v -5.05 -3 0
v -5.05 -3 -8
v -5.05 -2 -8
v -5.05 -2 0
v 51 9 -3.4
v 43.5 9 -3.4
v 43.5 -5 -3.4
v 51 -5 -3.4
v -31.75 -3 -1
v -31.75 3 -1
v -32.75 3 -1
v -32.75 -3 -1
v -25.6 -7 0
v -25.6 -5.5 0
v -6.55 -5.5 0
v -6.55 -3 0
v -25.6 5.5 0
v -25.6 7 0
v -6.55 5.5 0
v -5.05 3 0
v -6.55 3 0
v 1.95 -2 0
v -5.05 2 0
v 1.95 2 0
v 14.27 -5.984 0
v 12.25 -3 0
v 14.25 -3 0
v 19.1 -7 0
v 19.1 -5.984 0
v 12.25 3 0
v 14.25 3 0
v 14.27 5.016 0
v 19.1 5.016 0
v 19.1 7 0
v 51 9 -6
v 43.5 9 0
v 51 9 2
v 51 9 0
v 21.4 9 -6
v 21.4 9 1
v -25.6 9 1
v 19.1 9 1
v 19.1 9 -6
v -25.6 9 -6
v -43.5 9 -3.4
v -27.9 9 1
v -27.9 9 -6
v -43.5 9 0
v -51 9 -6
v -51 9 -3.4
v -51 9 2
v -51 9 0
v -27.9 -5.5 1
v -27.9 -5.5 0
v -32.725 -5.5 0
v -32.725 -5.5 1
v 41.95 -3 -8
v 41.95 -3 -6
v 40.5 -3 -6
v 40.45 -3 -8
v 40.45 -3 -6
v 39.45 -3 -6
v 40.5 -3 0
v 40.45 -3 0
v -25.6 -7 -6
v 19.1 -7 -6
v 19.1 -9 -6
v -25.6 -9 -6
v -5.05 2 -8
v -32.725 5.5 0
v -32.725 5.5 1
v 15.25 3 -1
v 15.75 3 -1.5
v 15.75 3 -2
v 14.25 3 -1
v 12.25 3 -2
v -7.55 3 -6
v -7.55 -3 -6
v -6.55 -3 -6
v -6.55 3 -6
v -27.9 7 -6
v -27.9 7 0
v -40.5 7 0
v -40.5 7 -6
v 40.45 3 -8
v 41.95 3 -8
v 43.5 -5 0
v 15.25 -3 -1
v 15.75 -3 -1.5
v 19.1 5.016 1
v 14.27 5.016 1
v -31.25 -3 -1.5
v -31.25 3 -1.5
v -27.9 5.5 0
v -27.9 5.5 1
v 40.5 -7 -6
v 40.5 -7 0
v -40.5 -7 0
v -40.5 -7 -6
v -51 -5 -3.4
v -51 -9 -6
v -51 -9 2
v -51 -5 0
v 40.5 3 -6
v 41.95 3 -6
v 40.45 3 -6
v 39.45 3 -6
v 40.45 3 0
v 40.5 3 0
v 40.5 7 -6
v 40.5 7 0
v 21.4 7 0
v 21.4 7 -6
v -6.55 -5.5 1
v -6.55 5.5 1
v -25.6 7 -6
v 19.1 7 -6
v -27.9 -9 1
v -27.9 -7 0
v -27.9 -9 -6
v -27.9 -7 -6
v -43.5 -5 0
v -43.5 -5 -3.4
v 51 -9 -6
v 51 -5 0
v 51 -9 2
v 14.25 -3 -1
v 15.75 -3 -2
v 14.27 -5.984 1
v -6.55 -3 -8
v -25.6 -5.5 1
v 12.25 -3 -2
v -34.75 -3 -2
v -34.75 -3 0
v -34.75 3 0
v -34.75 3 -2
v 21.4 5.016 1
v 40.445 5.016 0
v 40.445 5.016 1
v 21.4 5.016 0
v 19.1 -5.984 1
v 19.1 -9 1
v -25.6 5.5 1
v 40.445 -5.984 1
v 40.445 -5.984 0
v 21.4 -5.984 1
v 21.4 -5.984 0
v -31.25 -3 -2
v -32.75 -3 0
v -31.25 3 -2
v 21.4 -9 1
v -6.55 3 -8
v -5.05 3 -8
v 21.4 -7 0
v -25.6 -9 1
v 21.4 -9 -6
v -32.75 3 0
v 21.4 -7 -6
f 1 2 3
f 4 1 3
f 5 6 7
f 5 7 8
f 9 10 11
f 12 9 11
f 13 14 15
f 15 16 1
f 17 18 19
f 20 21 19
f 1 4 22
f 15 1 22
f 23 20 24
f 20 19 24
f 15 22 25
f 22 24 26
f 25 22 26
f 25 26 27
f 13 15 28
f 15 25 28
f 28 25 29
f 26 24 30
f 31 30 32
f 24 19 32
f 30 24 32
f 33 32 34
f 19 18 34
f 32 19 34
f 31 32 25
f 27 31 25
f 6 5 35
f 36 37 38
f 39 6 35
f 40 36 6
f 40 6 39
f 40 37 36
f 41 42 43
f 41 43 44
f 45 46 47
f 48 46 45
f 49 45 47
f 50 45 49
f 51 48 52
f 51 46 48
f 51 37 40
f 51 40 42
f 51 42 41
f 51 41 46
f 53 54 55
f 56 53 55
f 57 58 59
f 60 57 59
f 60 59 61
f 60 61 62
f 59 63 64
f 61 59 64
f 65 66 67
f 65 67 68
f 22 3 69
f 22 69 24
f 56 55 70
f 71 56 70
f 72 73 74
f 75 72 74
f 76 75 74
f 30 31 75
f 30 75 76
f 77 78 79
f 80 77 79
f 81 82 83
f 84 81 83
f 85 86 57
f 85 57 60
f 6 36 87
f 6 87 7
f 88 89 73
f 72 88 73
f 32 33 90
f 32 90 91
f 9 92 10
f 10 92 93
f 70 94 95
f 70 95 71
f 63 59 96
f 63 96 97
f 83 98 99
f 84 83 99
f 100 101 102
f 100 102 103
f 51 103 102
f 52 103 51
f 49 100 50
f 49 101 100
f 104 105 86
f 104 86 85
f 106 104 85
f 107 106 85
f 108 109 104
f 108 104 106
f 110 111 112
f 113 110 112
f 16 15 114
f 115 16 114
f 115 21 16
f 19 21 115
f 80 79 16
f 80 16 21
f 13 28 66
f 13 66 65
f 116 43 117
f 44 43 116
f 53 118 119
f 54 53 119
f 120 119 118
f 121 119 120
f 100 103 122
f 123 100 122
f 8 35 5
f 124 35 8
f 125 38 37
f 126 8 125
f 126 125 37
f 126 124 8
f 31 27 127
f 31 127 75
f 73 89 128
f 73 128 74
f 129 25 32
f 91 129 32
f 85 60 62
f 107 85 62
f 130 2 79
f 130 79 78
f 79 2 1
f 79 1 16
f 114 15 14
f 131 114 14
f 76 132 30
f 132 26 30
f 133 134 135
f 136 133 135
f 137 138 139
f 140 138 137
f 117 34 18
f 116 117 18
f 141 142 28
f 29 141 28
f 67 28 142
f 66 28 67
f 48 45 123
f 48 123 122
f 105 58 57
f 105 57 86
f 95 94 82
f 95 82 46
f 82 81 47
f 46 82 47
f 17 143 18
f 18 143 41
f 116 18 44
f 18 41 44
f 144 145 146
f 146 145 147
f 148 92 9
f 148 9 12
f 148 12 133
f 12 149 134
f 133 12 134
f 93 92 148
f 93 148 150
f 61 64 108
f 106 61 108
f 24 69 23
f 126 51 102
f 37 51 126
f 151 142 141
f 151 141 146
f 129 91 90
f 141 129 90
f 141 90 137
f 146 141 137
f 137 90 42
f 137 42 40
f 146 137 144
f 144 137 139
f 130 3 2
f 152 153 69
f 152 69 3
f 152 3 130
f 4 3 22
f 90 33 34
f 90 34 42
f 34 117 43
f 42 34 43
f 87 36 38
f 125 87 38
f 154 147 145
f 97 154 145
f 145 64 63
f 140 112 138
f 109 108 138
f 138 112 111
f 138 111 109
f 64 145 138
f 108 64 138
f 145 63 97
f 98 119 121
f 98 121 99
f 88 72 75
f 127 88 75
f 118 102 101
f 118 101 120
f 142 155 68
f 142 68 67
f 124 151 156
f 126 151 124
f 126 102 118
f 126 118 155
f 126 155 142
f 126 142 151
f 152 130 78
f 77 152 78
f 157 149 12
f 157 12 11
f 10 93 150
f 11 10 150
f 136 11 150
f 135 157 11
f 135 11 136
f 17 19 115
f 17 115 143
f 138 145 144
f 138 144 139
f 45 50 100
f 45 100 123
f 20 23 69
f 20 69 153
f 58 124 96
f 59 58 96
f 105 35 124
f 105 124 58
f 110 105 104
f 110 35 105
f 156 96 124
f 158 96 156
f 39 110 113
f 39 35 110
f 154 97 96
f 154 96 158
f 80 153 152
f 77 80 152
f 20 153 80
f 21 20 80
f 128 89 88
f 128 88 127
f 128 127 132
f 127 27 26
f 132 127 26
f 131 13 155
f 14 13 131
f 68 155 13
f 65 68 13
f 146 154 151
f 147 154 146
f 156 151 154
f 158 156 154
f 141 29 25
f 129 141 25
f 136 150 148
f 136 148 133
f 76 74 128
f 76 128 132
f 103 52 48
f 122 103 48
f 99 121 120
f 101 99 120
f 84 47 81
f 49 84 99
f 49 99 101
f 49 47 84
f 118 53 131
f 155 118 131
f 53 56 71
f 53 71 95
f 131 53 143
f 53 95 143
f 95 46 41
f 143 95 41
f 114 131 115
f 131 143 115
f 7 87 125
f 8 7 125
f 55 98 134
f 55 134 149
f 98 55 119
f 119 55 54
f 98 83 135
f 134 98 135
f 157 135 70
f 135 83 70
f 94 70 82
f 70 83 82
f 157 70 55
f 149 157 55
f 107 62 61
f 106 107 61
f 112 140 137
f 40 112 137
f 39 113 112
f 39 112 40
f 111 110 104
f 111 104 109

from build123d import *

# Parameters (mm, degrees)
SKETCH1_W            = 102
SKETCH1_H            = 18
BOSS_EXTRUDE1_DEPTH  = 2
BOSS_EXTRUDE2_DEPTH  = 18
SKETCH4_W            = 81
SKETCH4_H            = 2
BOSS_EXTRUDE3_DEPTH  = 6
SKETCH5_W            = 2.3
SKETCH5_H            = 2
CUT_EXTRUDE1_DEPTH   = 6
SKETCH8_W            = 2
SKETCH8_H            = 6
BOSS_EXTRUDE5_DEPTH  = 1
SKETCH10_W           = 3.5
SKETCH10_H           = 6
BOSS_EXTRUDE6_DEPTH  = 1
SKETCH11_W           = 1.5
SKETCH11_H           = 6
BOSS_EXTRUDE7_DEPTH  = 8
BOSS_EXTRUDE8_DEPTH  = 6
RIB1_REACH           = 54.402
SKETCH17_WALL_W      = 117.434725866
SKETCH17_WALL_H      = 4
CHAMFER1_SIZE        = 0.5
SKETCH18_W           = 7.5
SKETCH18_H           = 3.4
BOSS_EXTRUDE10_DEPTH = 4
SKETCH19_W           = 26.1754507
SKETCH19_H           = 11
CUT_EXTRUDE3_DEPTH   = 1
SKETCH20_W           = 2.3
SKETCH20_H           = 1
CUT_EXTRUDE4_DEPTH   = 18


with BuildPart() as part:
    # Sketch1 → Boss-Extrude1 (new body)
    with BuildSketch(Plane.XY):
        Rectangle(SKETCH1_W, SKETCH1_H)
    extrude(amount=BOSS_EXTRUDE1_DEPTH)

    # Sketch2 → Boss-Extrude2 (add)
    with BuildSketch(Plane(origin=(0, 9, 0), x_dir=(1, 0, 0), z_dir=(0, 1, 0))):
        Polygon((-43.5, 0), (-40.5, 0), (-40.5, 6), (-51, 6), (-51, 3.4), (-43.5, 3.4), align=None)
        Polygon((40.5, 6), (40.5, 0), (43.5, 0), (43.5, 3.4), (51, 3.4), (51, 6), align=None)
    extrude(amount=-BOSS_EXTRUDE2_DEPTH)

    # Sketch4 → Boss-Extrude3 (add)
    with BuildSketch(Plane(origin=(0, 0, 0), x_dir=(-1, 0, 0), z_dir=(0, 0, -1))):
        with Locations((0, 8)):
            Rectangle(SKETCH4_W, SKETCH4_H)
        with Locations((0, -8)):
            Rectangle(SKETCH4_W, SKETCH4_H)
    extrude(amount=BOSS_EXTRUDE3_DEPTH)

    # Sketch5 → Cut-Extrude1 (cut)
    with BuildSketch(Plane(origin=(0, 0, -6), x_dir=(-1, 0, 0), z_dir=(0, 0, -1))):
        with Locations((26.75, -8)):
            Rectangle(SKETCH5_W, SKETCH5_H)
        with Locations((26.75, 8)):
            Rectangle(SKETCH5_W, SKETCH5_H)
        with Locations((-20.25, 8)):
            Rectangle(SKETCH5_W, SKETCH5_H)
        with Locations((-20.25, -8)):
            Rectangle(SKETCH5_W, SKETCH5_H)
    extrude(amount=-CUT_EXTRUDE1_DEPTH, mode=Mode.SUBTRACT)

    # Sketch8 → Boss-Extrude5 (add)
    with BuildSketch(Plane(origin=(0, 0, 0), x_dir=(-1, 0, 0), z_dir=(0, 0, -1))):
        with Locations((33.75, 0)):
            Rectangle(SKETCH8_W, SKETCH8_H)
        with Locations((-13.25, 0)):
            Rectangle(SKETCH8_W, SKETCH8_H)
    extrude(amount=BOSS_EXTRUDE5_DEPTH)

    # Sketch10 → Boss-Extrude6 (add)
    with BuildSketch(Plane(origin=(0, 0, -1), x_dir=(-1, 0, 0), z_dir=(0, 0, -1))):
        with Locations((-14, 0)):
            Rectangle(SKETCH10_W, SKETCH10_H)
        with Locations((33, 0)):
            Rectangle(SKETCH10_W, SKETCH10_H)
    extrude(amount=BOSS_EXTRUDE6_DEPTH)

    # Sketch11 → Boss-Extrude7 (add)
    with BuildSketch(Plane(origin=(0, 0, 0), x_dir=(-1, 0, 0), z_dir=(0, 0, -1))):
        with Locations((5.8, 0)):
            Rectangle(SKETCH11_W, SKETCH11_H)
        with Locations((-41.2, 0)):
            Rectangle(SKETCH11_W, SKETCH11_H)
    extrude(amount=BOSS_EXTRUDE7_DEPTH)

    # Sketch12 → Boss-Extrude8 (add)
    with BuildSketch(Plane.XZ.offset(3)):
        Polygon((-6.55, -8), (-7.55, -6), (-6.55, -6), align=None)
        Polygon((40.45, -8), (39.45, -6), (40.45, -6), align=None)
    extrude(amount=-BOSS_EXTRUDE8_DEPTH)

    # Sketch17 wall → Rib1 (add, up to next)
    with BuildSketch(Plane(origin=(-1.55, 0, -4), x_dir=(0.658504607869, 0, 0.752576694707), z_dir=(0.752576694707, 0, -0.658504607869)), mode=Mode.PRIVATE) as rib1_sk1:
        Rectangle(SKETCH17_WALL_W, SKETCH17_WALL_H)
    rib1_tool1 = extrude(rib1_sk1.sketch, amount=-RIB1_REACH, mode=Mode.PRIVATE) - part.part
    add(rib1_tool1.solids().sort_by_distance((-1.55, 0, -4))[0])

    # Chamfer1
    chamfer1_edges = [part.edges().sort_by_distance(p)[0] for p in [
        (-31.25, 0, -1),
        (15.75, 0, -1),
    ]]
    chamfer(chamfer1_edges, length=CHAMFER1_SIZE)

    # Sketch18 → Boss-Extrude10 (add)
    with BuildSketch(Plane.XZ.offset(9)):
        with Locations((47.25, -1.7)):
            Rectangle(SKETCH18_W, SKETCH18_H)
        with Locations((-47.25, -1.7)):
            Rectangle(SKETCH18_W, SKETCH18_H)
    extrude(amount=-BOSS_EXTRUDE10_DEPTH)

    # Sketch19 → Cut-Extrude3 (cut)
    with BuildSketch(Plane(origin=(0, 0, 0), x_dir=(-1, 0, 0), z_dir=(0, 0, -1))):
        with Locations((19.63772535, 0)):
            Rectangle(SKETCH19_W, SKETCH19_H)
        with Locations((-27.35772535, -0.484068742)):
            Rectangle(SKETCH19_W, SKETCH19_H)
    extrude(amount=-CUT_EXTRUDE3_DEPTH, mode=Mode.SUBTRACT)

    # Sketch20 → Cut-Extrude4 (cut)
    with BuildSketch(Plane(origin=(0, 9, 0), x_dir=(1, 0, 0), z_dir=(0, 1, 0))):
        with Locations((-26.75, -0.5)):
            Rectangle(SKETCH20_W, SKETCH20_H)
        with Locations((20.25, -0.5)):
            Rectangle(SKETCH20_W, SKETCH20_H)
    extrude(amount=-CUT_EXTRUDE4_DEPTH, mode=Mode.SUBTRACT)


solid = part.part
